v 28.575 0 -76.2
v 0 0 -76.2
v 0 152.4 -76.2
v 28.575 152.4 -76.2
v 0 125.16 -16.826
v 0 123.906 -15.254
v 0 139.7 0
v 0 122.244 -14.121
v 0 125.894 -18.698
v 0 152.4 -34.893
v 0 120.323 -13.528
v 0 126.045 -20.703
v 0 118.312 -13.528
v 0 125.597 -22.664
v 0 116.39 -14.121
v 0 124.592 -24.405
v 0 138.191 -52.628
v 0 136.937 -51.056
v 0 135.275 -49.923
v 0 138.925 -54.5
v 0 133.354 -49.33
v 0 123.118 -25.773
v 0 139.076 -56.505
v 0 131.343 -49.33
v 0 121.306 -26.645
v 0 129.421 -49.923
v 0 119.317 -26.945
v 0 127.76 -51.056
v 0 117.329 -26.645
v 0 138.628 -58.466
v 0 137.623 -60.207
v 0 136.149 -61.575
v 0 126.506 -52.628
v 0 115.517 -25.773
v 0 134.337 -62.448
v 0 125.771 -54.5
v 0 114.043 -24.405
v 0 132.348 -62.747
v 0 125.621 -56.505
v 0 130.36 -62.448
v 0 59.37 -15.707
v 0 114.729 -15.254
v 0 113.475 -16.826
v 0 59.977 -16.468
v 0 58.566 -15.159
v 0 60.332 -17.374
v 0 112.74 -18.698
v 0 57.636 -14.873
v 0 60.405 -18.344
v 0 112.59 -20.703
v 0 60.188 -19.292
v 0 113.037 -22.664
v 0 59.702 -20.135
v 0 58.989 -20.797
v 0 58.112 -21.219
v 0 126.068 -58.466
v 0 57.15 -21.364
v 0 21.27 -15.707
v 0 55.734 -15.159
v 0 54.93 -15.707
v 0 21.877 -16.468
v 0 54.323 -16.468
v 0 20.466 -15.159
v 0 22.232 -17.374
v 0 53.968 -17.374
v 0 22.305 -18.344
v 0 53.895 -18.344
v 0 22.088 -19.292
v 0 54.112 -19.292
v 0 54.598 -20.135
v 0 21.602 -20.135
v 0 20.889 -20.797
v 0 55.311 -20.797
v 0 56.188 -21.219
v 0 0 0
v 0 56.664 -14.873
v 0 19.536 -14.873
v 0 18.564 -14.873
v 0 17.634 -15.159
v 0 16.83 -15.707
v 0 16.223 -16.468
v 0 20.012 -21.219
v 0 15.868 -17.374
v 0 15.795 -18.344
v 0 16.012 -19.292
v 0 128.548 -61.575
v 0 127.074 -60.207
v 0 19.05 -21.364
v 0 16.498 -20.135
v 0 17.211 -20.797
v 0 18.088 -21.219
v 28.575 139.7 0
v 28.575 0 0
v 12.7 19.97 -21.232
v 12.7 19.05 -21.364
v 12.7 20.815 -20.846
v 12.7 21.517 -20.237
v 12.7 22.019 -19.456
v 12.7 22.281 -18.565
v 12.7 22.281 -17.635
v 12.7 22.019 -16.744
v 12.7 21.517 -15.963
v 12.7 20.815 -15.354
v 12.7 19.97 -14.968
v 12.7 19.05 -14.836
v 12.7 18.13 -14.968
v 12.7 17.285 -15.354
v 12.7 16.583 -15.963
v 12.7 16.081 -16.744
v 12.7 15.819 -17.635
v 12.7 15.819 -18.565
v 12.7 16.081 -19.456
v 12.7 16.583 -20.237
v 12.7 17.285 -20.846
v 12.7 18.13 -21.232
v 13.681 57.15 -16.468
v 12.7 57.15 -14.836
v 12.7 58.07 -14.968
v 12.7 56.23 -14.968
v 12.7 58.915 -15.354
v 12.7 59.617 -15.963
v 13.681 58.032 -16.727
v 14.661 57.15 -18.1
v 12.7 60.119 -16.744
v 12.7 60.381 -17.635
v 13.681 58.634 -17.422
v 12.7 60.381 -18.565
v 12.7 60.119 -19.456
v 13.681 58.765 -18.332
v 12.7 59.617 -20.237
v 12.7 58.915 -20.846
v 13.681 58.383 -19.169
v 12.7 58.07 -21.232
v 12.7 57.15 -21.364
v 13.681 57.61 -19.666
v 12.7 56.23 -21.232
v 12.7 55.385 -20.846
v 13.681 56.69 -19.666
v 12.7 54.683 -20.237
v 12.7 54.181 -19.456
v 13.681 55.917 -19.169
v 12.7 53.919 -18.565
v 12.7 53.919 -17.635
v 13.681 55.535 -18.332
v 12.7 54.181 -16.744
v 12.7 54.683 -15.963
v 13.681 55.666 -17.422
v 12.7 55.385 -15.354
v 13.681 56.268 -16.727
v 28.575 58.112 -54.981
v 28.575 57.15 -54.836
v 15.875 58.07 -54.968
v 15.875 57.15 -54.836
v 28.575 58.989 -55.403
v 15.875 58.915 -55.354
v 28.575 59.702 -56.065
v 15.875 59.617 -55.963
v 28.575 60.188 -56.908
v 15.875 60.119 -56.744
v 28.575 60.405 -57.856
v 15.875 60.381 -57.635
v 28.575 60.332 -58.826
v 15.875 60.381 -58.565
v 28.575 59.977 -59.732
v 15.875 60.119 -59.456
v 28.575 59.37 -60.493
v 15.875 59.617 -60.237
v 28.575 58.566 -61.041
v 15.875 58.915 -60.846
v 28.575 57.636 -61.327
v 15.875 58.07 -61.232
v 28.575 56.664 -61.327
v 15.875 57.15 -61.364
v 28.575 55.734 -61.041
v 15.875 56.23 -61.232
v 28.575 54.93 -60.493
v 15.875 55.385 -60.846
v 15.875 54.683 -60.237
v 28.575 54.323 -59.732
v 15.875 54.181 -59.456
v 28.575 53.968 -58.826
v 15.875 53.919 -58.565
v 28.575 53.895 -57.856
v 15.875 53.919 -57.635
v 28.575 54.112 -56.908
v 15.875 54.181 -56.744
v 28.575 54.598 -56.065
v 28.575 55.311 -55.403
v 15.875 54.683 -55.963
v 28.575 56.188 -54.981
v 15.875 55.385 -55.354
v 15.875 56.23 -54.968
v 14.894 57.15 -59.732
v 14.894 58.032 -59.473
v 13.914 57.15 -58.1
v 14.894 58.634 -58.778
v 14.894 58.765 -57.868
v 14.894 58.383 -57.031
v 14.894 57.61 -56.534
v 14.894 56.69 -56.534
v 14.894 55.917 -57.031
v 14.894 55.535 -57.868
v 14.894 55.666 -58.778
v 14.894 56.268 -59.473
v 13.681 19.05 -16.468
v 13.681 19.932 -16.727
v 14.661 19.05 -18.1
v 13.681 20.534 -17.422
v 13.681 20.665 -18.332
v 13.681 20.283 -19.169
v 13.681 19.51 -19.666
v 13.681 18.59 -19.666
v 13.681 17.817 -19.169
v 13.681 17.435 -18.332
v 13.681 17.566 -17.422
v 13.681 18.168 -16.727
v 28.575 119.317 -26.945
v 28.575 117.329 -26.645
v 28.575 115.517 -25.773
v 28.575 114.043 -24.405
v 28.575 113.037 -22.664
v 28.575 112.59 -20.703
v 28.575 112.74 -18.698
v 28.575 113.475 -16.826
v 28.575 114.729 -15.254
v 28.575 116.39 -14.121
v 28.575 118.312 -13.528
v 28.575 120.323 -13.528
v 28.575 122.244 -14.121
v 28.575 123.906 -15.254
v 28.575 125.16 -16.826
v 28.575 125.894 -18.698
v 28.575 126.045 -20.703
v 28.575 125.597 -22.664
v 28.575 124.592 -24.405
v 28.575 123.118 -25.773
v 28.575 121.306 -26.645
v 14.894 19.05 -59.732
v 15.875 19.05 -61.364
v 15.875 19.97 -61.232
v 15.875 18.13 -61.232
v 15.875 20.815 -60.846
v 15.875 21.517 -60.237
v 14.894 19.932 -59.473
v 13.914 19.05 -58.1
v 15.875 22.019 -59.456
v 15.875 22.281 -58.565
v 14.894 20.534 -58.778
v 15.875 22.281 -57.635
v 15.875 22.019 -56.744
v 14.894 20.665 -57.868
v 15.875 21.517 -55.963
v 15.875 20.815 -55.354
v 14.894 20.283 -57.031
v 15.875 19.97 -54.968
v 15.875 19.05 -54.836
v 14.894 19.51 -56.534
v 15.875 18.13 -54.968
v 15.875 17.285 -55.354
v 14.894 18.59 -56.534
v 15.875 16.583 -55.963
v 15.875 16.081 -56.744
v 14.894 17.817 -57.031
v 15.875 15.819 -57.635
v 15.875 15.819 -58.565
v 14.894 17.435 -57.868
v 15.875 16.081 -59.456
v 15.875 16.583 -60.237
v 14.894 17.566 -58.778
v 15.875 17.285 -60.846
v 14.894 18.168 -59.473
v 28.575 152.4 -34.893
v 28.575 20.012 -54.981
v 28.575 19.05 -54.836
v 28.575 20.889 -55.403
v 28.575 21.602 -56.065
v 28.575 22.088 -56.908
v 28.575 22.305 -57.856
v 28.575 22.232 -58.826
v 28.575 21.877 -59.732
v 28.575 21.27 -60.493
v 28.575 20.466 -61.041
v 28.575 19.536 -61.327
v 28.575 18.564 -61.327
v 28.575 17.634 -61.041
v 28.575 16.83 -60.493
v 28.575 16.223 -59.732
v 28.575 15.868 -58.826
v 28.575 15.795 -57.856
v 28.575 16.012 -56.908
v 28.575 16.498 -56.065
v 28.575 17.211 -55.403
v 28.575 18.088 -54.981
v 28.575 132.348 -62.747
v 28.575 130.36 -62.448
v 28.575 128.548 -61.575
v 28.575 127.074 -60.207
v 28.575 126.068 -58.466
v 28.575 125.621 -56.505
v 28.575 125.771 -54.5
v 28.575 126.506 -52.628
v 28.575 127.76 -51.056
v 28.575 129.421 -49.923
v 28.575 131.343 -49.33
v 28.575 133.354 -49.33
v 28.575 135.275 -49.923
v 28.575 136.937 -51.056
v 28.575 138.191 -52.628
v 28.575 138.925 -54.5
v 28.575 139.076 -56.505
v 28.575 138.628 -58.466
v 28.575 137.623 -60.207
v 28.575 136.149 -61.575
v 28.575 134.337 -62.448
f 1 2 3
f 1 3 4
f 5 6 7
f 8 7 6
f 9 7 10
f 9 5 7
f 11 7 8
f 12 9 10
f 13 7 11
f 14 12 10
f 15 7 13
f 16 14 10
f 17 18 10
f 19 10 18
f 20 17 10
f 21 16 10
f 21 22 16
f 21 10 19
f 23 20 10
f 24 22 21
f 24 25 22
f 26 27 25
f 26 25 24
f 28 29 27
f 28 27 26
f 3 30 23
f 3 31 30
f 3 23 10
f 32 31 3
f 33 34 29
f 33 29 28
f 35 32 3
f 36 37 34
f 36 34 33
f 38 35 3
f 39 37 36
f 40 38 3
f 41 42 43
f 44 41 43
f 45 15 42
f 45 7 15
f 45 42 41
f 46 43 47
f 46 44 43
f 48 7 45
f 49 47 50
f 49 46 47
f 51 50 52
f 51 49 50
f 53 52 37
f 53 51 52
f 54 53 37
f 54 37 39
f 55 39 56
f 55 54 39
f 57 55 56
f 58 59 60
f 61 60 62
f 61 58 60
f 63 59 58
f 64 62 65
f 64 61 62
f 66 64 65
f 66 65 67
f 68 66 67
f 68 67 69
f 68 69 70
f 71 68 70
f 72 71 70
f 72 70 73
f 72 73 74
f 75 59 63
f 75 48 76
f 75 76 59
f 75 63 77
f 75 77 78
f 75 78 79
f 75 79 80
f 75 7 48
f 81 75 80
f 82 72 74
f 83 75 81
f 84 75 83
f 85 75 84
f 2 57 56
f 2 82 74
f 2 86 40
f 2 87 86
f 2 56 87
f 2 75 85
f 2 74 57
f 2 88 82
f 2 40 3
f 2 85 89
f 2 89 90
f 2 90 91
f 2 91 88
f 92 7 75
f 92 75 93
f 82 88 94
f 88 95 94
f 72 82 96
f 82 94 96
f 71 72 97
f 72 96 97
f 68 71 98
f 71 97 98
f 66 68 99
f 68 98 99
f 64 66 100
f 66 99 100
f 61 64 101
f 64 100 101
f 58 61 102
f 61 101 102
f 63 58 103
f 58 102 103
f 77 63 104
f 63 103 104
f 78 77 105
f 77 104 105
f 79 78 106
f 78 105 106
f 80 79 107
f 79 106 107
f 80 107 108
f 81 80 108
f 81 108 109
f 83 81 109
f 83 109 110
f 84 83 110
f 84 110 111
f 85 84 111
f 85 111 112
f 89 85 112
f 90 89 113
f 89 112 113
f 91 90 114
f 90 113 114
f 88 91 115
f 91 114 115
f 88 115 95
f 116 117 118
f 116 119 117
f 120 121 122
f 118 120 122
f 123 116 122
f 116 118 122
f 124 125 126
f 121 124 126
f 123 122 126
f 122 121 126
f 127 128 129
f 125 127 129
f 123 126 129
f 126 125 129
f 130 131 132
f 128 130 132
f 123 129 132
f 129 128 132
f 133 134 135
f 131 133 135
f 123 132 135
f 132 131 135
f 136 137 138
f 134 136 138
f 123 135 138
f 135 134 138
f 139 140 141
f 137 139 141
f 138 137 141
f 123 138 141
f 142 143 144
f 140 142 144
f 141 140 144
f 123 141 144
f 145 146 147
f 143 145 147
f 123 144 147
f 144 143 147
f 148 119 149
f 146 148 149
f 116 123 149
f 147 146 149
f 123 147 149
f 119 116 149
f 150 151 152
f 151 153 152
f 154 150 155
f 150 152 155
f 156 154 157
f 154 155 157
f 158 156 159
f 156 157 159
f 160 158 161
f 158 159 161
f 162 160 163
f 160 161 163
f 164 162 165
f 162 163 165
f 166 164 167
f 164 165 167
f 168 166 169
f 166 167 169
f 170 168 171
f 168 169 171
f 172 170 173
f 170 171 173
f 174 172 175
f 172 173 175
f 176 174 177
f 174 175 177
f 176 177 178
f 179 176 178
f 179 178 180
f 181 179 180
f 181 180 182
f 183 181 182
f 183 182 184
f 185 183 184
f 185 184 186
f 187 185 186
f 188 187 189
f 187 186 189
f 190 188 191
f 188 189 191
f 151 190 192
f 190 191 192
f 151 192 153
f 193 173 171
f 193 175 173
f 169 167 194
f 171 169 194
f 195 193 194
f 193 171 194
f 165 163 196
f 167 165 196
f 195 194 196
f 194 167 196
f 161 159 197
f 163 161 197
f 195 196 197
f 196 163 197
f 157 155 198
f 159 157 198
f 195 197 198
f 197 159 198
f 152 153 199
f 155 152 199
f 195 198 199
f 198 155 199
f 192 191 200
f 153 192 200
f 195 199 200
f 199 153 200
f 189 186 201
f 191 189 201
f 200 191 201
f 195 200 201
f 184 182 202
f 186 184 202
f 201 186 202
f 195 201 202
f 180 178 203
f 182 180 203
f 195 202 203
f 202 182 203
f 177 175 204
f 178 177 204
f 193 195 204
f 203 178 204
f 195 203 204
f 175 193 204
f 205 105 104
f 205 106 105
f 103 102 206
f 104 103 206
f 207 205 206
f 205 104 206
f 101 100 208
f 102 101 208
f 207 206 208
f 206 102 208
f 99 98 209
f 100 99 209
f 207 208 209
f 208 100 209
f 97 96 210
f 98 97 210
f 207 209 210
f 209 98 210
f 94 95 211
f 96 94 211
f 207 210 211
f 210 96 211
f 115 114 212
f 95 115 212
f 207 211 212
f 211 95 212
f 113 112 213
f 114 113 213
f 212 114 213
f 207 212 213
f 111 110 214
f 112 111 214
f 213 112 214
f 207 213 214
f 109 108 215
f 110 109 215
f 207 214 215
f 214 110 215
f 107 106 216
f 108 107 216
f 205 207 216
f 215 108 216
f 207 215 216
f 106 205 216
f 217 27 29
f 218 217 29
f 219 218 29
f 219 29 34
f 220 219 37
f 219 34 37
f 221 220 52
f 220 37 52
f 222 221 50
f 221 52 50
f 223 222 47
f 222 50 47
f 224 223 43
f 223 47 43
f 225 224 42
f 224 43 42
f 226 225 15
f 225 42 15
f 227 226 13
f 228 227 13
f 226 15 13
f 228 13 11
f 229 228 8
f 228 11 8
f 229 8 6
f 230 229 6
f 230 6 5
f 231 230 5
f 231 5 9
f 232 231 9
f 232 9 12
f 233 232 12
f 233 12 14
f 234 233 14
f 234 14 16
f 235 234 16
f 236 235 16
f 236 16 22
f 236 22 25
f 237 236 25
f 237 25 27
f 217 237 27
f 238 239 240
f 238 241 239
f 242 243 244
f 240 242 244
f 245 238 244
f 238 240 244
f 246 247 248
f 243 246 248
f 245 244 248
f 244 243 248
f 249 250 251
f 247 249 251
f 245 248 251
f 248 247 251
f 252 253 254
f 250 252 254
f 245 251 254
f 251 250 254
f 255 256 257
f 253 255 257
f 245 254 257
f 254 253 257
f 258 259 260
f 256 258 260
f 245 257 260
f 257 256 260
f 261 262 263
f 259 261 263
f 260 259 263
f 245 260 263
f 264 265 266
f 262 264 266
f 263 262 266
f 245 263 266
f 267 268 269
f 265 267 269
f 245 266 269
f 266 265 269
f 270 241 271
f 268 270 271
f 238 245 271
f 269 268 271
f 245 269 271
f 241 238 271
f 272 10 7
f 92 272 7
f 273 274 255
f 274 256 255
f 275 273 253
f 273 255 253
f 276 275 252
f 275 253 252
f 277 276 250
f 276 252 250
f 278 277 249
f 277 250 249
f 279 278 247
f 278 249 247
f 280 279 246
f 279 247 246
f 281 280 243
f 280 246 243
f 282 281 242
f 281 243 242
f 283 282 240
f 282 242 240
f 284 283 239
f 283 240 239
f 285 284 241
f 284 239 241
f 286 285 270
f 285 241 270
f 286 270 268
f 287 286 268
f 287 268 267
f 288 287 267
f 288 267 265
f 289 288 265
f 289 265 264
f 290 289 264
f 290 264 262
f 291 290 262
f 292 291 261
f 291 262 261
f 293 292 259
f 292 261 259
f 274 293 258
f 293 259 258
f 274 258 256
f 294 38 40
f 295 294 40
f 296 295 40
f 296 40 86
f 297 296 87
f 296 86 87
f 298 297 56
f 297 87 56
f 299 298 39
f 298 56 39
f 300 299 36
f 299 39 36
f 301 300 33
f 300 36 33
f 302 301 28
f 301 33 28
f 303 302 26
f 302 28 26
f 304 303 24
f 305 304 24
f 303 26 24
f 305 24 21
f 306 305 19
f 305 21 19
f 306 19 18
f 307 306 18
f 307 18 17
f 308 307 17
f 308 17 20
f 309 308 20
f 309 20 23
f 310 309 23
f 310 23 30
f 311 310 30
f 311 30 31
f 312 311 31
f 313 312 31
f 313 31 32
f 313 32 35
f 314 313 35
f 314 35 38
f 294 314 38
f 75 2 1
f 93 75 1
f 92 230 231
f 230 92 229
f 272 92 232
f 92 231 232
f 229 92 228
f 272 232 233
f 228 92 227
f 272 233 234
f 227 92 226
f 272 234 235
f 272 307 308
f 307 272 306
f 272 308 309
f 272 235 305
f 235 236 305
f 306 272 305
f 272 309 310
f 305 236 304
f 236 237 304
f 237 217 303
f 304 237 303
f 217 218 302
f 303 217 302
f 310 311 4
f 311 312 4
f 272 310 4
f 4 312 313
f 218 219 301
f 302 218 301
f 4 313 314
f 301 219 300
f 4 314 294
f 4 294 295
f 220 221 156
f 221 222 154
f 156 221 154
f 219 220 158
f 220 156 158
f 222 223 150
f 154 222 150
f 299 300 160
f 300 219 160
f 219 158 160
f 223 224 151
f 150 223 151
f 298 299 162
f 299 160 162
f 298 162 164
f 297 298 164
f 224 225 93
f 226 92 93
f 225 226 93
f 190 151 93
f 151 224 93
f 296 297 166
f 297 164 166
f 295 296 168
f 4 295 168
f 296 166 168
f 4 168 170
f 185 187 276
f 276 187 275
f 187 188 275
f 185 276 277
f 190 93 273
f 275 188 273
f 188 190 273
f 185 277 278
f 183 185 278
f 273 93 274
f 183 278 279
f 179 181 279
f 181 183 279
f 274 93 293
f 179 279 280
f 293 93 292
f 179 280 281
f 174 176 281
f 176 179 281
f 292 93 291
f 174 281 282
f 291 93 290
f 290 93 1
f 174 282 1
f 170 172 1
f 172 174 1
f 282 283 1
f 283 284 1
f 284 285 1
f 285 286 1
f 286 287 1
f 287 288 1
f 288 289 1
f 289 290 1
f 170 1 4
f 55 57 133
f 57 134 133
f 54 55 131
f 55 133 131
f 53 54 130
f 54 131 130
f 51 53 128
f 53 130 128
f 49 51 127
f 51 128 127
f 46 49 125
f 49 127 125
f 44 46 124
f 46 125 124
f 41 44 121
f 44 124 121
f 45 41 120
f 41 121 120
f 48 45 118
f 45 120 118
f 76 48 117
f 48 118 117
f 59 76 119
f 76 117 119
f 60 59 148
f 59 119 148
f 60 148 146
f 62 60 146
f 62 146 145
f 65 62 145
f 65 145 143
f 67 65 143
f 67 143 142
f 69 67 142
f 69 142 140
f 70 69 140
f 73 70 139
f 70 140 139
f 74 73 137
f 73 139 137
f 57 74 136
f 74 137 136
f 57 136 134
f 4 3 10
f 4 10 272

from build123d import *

# Parameters (mm, degrees)
SKETCH1_W                        = 28.575
SKETCH1_H                        = 76.2
BOSS_EXTRUDE1_DEPTH              = 152.4
F_1_2_CLEARANCE_HOLE1_D          = 13.49248
TAP_DRILL_FOR_5_16_18_TAP1_D     = 6.5278
TAP_DRILL_FOR_5_16_18_TAP1_DEPTH = 12.7
TAP_DRILL_FOR_5_16_18_TAP1_TIP   = 1.961148974
TAP_DRILL_FOR_5_16_18_TAP2_D     = 6.5278
TAP_DRILL_FOR_5_16_18_TAP2_DEPTH = 12.7
TAP_DRILL_FOR_5_16_18_TAP2_TIP   = 1.961148974
CUT_EXTRUDE1_DEPTH               = 173.767851827


with BuildPart() as part:
    # Sketch1 → Boss-Extrude1 (new body)
    with BuildSketch(Plane(origin=(0, 0, 0), x_dir=(1, 0, 0), z_dir=(0, 1, 0))):
        with Locations((14.2875, 38.1)):
            Rectangle(SKETCH1_W, SKETCH1_H)
    extrude(amount=BOSS_EXTRUDE1_DEPTH)

    # 1/2 Clearance Hole1 (through all)
    with Locations(Plane(origin=(28.575, 119.317250344, -20.198855574), x_dir=(0, 0, 1), z_dir=(1, 0, 0))):
        with Locations((0, 0), (-35.802288852, -13.030967461)):
            Hole(F_1_2_CLEARANCE_HOLE1_D / 2)

    # Tap Drill for 5/16-18 Tap1
    with Locations(Plane(origin=(28.575, 0, 0), x_dir=(0, 0, -1), z_dir=(1, 0, 0))):
        with Locations((58.1, 57.15), (58.1, 19.05)):
            Hole(TAP_DRILL_FOR_5_16_18_TAP1_D / 2, depth=TAP_DRILL_FOR_5_16_18_TAP1_DEPTH)
            with Locations((0, 0, -(TAP_DRILL_FOR_5_16_18_TAP1_DEPTH + TAP_DRILL_FOR_5_16_18_TAP1_TIP / 2))):  # 118° drill point
                Cone(0, TAP_DRILL_FOR_5_16_18_TAP1_D / 2, TAP_DRILL_FOR_5_16_18_TAP1_TIP, mode=Mode.SUBTRACT)

    # Tap Drill for 5/16-18 Tap2
    with Locations(Plane.ZY):
        with Locations((-18.1, 57.15), (-18.1, 19.05)):
            Hole(TAP_DRILL_FOR_5_16_18_TAP2_D / 2, depth=TAP_DRILL_FOR_5_16_18_TAP2_DEPTH)
            with Locations((0, 0, -(TAP_DRILL_FOR_5_16_18_TAP2_DEPTH + TAP_DRILL_FOR_5_16_18_TAP2_TIP / 2))):  # 118° drill point
                Cone(0, TAP_DRILL_FOR_5_16_18_TAP2_D / 2, TAP_DRILL_FOR_5_16_18_TAP2_TIP, mode=Mode.SUBTRACT)

    # Sketch12 → Cut-Extrude1 (cut, through all)
    with BuildSketch(Plane.ZY):
        Polygon((-34.892963227, 152.4), (0, 139.7), (0, 152.4), align=None)
    extrude(amount=-CUT_EXTRUDE1_DEPTH, mode=Mode.SUBTRACT)


solid = part.part
